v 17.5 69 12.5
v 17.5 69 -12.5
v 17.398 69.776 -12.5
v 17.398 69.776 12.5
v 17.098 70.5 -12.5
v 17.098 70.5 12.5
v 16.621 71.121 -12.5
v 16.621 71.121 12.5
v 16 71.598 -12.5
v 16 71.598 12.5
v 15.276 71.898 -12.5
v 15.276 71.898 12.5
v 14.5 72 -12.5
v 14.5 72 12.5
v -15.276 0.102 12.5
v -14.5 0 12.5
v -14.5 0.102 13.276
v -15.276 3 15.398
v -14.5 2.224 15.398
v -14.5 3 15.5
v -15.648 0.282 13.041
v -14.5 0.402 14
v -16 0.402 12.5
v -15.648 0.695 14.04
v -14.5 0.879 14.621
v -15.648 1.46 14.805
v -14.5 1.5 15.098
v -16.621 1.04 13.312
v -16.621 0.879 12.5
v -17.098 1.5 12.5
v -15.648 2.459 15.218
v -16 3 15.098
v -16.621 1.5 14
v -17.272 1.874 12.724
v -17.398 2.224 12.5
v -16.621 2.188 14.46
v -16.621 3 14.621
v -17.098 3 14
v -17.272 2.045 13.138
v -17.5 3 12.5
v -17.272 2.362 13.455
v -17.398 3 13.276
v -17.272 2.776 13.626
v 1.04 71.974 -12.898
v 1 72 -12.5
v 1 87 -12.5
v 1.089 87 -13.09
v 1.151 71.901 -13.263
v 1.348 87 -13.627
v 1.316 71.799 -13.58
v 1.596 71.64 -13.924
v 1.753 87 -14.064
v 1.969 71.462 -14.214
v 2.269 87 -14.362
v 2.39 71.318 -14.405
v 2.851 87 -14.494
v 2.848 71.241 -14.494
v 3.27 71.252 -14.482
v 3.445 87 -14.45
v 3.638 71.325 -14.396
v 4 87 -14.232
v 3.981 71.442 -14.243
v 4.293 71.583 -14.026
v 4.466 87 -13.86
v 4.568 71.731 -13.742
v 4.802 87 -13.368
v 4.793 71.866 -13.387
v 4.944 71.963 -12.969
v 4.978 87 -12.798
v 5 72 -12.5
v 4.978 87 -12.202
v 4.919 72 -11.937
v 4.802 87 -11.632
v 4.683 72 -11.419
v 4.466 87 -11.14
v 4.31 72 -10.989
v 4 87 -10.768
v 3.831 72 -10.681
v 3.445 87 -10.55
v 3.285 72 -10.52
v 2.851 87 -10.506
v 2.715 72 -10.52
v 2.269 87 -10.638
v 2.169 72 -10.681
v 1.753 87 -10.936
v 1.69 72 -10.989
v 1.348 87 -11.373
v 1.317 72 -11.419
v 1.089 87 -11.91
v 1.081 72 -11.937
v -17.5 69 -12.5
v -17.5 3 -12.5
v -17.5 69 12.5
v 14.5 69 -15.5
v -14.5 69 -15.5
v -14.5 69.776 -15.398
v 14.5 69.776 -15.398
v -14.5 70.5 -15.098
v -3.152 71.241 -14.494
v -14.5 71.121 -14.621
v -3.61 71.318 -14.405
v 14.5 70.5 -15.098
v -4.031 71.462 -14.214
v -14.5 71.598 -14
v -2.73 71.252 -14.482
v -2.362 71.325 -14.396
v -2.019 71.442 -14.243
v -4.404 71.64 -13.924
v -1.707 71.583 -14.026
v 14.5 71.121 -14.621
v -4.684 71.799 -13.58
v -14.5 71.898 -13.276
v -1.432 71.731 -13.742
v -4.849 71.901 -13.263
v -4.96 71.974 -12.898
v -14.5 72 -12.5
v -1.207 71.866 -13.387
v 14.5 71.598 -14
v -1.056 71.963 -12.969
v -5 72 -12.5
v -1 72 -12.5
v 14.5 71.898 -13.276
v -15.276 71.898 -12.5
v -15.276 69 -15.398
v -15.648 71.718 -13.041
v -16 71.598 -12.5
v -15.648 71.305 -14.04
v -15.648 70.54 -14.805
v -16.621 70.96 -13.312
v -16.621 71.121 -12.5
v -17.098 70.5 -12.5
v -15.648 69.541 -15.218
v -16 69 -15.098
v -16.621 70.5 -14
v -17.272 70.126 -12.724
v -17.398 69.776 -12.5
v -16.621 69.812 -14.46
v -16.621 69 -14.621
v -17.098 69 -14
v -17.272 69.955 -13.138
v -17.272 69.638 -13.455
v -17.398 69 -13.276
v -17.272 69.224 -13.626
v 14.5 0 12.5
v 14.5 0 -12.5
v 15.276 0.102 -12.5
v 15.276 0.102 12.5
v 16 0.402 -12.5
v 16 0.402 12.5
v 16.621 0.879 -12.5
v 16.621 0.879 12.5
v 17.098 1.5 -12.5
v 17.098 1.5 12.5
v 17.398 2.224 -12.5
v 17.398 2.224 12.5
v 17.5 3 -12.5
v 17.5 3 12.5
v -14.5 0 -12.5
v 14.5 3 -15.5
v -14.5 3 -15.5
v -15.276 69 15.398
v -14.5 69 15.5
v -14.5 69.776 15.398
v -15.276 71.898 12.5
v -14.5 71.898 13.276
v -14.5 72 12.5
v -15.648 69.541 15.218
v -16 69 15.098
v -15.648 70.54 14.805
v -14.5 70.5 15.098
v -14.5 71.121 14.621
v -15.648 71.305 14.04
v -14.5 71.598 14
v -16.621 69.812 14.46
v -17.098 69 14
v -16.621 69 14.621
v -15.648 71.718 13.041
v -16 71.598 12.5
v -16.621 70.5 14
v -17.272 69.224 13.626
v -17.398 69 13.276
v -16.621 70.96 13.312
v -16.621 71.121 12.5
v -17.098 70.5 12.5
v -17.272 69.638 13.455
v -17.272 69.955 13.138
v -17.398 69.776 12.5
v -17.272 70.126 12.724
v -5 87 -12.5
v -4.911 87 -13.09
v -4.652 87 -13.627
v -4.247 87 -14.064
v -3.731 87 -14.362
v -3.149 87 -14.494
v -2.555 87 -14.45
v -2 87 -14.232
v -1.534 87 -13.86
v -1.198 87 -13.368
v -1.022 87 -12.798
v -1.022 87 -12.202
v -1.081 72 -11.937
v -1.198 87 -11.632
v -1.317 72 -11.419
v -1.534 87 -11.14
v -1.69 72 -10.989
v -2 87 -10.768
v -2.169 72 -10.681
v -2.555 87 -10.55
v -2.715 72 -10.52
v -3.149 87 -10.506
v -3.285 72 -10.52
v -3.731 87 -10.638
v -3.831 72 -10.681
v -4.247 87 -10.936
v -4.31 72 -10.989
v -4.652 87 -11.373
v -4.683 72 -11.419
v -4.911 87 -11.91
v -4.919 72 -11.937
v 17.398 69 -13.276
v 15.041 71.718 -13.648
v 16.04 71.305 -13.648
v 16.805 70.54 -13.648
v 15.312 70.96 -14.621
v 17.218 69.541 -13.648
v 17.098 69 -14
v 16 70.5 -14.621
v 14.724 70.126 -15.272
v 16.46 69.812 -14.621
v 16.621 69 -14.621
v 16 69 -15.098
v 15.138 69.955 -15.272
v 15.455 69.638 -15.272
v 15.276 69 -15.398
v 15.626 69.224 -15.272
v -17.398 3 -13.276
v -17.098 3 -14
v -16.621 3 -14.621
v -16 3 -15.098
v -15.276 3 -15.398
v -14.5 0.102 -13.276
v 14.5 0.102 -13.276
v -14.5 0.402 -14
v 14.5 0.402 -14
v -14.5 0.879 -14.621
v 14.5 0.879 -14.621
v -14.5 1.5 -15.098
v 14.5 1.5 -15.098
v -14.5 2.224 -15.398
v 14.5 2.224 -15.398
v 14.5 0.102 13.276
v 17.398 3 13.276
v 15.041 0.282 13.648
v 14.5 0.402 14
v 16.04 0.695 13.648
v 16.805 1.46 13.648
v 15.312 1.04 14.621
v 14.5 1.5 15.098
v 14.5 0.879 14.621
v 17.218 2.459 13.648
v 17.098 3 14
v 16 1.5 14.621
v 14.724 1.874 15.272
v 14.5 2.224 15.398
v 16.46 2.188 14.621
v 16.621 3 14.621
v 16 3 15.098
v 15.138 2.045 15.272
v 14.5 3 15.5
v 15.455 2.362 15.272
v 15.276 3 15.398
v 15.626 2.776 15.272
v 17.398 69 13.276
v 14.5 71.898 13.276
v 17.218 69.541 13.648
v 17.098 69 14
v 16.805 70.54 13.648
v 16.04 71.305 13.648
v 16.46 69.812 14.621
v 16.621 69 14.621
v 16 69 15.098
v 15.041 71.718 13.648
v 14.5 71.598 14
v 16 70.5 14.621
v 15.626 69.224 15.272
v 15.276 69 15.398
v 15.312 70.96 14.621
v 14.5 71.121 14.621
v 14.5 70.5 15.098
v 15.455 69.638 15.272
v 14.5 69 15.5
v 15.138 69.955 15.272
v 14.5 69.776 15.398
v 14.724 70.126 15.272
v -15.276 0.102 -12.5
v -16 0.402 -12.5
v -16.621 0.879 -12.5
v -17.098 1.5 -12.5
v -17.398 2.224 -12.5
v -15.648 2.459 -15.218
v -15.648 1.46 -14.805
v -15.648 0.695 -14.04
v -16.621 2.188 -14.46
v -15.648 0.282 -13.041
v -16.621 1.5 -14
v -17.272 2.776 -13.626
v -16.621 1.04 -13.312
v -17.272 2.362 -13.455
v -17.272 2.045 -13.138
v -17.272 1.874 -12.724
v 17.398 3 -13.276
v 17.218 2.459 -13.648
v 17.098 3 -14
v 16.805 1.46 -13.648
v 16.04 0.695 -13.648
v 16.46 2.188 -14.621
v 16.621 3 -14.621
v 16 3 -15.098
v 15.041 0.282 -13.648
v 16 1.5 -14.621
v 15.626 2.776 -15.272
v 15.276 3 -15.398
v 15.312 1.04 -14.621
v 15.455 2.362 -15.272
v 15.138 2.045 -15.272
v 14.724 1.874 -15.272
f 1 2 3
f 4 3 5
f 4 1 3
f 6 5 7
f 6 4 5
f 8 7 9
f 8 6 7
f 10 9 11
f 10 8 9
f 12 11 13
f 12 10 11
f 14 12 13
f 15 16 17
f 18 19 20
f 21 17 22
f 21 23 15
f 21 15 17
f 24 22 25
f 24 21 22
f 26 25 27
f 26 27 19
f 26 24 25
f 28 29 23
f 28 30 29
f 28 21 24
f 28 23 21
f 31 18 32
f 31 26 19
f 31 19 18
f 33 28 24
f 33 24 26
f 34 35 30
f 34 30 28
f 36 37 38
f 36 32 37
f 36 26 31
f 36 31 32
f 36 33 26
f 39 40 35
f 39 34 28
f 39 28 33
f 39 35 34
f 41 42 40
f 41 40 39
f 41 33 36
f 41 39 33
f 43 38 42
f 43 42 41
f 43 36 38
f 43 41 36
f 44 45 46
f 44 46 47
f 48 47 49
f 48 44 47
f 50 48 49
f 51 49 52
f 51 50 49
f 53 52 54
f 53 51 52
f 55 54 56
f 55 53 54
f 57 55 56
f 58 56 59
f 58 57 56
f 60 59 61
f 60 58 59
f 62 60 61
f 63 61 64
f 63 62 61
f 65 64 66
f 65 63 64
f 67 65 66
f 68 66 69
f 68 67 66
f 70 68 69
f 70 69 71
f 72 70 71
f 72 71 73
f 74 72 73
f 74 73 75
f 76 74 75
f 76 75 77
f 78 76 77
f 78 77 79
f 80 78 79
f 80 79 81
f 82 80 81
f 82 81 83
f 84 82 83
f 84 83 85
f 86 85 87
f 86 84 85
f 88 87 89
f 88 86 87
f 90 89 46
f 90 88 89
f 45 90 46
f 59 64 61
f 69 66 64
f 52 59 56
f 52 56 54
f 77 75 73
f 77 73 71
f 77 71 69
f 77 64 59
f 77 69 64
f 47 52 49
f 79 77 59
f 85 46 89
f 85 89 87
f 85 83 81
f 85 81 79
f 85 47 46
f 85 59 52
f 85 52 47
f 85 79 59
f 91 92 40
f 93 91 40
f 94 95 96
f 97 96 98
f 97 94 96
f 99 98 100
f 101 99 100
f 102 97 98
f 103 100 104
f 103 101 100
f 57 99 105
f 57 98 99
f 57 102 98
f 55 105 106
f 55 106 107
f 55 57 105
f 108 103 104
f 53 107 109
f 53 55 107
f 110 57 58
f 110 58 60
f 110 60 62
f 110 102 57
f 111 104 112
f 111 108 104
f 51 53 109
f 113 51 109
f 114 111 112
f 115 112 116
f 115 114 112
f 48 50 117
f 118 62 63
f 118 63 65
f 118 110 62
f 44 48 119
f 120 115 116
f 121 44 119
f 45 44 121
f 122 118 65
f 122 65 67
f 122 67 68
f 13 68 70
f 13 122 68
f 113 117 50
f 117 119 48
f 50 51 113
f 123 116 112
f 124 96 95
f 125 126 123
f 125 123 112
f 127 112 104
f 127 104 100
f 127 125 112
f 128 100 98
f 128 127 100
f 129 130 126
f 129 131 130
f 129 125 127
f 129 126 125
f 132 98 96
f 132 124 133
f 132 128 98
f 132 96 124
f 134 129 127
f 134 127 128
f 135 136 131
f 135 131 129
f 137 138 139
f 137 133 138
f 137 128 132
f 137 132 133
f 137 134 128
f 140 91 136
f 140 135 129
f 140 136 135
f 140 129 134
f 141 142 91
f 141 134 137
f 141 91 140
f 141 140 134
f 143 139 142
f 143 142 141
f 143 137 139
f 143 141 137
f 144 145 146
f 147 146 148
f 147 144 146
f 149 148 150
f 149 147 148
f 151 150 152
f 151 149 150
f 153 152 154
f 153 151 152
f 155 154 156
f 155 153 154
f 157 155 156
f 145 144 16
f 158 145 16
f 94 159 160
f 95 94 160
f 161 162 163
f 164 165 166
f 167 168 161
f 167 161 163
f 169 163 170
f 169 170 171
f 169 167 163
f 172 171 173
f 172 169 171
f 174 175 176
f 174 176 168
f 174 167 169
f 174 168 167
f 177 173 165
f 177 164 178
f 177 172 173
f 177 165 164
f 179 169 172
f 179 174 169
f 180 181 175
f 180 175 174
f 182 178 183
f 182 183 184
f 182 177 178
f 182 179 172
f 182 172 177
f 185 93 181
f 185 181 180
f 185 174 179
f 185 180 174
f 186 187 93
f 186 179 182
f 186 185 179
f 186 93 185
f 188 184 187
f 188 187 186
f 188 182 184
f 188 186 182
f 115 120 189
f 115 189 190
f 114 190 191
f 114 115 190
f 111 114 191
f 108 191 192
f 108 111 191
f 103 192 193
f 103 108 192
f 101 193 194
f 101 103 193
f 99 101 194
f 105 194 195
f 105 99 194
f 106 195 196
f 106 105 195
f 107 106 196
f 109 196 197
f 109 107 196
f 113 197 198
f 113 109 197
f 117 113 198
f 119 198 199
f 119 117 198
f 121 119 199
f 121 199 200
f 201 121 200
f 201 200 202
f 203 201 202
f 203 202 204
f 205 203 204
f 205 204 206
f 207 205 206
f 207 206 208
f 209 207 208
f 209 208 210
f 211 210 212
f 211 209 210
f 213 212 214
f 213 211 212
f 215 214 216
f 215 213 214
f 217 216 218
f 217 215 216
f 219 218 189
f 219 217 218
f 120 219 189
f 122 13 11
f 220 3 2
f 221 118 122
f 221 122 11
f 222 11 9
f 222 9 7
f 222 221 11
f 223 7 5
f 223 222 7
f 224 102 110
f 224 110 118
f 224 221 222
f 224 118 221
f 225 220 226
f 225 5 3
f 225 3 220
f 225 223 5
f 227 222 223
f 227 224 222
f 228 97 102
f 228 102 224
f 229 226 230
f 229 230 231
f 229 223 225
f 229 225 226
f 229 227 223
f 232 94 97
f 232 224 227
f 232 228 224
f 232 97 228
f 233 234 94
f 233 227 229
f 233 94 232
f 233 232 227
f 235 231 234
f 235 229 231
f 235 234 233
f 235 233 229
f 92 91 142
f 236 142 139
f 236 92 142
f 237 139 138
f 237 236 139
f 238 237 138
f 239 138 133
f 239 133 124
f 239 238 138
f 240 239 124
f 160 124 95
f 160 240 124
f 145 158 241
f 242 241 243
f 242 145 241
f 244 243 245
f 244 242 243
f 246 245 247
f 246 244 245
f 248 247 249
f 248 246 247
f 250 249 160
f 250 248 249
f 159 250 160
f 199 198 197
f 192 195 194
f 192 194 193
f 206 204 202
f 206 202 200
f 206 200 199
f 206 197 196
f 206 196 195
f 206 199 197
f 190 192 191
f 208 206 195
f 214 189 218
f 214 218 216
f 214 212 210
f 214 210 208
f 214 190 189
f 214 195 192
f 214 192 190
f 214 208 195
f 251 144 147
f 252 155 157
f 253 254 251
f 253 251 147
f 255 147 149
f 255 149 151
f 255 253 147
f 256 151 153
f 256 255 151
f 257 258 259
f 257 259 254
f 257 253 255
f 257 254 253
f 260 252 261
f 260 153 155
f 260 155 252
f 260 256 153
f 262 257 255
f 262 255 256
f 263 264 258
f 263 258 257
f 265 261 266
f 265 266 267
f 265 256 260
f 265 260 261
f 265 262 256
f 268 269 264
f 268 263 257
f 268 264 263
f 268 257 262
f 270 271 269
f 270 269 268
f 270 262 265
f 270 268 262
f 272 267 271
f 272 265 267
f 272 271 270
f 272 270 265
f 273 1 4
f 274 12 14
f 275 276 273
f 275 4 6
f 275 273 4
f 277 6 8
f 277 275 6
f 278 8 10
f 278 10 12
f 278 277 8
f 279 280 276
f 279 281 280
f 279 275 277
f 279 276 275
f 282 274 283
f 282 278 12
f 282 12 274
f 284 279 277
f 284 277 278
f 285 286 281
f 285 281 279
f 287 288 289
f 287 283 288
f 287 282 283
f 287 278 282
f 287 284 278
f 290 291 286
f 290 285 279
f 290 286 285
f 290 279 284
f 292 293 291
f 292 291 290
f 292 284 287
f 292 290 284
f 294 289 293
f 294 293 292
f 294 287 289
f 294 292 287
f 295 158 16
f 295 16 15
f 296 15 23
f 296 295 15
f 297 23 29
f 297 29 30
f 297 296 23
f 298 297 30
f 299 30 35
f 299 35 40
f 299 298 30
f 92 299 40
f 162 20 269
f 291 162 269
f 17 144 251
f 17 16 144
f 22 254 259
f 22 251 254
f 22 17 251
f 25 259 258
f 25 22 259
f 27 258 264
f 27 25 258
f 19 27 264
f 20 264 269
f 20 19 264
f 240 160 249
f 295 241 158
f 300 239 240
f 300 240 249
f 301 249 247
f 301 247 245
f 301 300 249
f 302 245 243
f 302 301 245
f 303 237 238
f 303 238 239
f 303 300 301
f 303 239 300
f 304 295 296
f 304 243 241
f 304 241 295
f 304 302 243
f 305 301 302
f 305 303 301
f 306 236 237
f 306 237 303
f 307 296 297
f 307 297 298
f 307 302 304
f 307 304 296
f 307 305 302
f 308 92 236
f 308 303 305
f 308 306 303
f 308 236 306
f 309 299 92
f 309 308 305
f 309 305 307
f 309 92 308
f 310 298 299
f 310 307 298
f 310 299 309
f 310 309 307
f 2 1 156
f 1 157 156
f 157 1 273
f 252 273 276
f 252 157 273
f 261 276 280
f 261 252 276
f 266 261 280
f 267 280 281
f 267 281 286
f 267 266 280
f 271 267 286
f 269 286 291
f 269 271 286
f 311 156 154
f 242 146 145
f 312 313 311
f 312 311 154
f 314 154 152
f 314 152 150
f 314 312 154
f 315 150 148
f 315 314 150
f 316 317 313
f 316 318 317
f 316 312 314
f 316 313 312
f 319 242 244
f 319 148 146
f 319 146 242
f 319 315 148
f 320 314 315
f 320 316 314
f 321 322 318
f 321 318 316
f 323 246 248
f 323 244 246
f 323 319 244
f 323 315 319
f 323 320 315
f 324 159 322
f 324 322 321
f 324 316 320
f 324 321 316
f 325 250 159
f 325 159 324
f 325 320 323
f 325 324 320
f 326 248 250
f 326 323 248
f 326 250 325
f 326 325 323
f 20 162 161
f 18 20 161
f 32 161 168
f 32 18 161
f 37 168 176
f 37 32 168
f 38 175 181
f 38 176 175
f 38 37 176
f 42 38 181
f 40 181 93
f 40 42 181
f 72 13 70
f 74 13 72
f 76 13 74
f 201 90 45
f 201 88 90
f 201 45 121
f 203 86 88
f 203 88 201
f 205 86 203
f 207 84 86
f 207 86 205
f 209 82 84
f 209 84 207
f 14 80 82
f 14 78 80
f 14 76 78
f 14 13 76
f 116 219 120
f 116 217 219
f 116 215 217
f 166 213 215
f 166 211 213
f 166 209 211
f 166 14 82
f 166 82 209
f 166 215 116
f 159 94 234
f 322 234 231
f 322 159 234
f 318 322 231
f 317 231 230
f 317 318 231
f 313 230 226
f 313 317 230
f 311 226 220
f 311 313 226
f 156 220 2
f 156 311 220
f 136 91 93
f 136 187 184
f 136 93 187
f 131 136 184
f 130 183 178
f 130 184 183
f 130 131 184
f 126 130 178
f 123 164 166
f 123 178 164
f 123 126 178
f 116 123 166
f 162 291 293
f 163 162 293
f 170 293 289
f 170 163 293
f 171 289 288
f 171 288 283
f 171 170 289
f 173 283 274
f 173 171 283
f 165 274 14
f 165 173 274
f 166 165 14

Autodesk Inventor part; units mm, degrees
ref_plane "YZ Plane" through (0, 0, 0) normal (1, 0, 0) x (0, 1, 0)
ref_plane "XZ Plane" through (0, 0, 0) normal (0, 1, 0) x (-1, 0, 0)
ref_plane "XY Plane" through (0, 0, 0) normal (0, 0, 1) x (1, 0, 0)
sketch "Sketch1" plane through (0, 0, 0) normal (0, 1, 0) x (-1, 0, 0)
  line L0 (17.5, 15.5) -> (-17.5, 15.5)
  line L1 (-17.5, 15.5) -> (-17.5, -15.5)
  line L2 (-17.5, -15.5) -> (17.5, -15.5)
  line L3 (17.5, -15.5) -> (17.5, 15.5)
  line L4 (17.5, 15.5) -> (-17.5, -15.5) construction
  line L5 (-17.5, 15.5) -> (17.5, -15.5) construction
  line L6 (0, -15.5) -> (0, -12.5) construction
  line L7 (0, -12.5) -> (3, -12.5) construction
  circle A0 centre (3, -12.5) radius 2
  circle A1 centre (-3, -12.5) radius 2
  point P0 (0, 0)
  dimension "d0" = 35
  dimension "d1" = 31
  dimension "d5" = 3
  dimension "d6" = 3
  dimension "d7" = 4
extrude "Extrusion1" add sketch "Sketch1" along normal blind 72 contours L3 L2 L1 L0 | A0 | A1
extrude "Extrusion2" add sketch "Sketch1" along normal blind 15 from surface at 72 contours A0 | A1
fillet "Fillet1" radius 3 12 edges at (17.5, 36, 15.5) (17.5, 36, -15.5) (-17.5, 36, 15.5) (-17.5, 36, -15.5) (17.5, 72, 0) (0, 72, 15.5) (0, 72, -15.5) (-17.5, 72, 0) (17.5, 0, 0) (0, 0, 15.5) (-17.5, 0, 0) (0, 0, -15.5)
properties part number "LEMONRC 1300 - 14.8V (35C)"
